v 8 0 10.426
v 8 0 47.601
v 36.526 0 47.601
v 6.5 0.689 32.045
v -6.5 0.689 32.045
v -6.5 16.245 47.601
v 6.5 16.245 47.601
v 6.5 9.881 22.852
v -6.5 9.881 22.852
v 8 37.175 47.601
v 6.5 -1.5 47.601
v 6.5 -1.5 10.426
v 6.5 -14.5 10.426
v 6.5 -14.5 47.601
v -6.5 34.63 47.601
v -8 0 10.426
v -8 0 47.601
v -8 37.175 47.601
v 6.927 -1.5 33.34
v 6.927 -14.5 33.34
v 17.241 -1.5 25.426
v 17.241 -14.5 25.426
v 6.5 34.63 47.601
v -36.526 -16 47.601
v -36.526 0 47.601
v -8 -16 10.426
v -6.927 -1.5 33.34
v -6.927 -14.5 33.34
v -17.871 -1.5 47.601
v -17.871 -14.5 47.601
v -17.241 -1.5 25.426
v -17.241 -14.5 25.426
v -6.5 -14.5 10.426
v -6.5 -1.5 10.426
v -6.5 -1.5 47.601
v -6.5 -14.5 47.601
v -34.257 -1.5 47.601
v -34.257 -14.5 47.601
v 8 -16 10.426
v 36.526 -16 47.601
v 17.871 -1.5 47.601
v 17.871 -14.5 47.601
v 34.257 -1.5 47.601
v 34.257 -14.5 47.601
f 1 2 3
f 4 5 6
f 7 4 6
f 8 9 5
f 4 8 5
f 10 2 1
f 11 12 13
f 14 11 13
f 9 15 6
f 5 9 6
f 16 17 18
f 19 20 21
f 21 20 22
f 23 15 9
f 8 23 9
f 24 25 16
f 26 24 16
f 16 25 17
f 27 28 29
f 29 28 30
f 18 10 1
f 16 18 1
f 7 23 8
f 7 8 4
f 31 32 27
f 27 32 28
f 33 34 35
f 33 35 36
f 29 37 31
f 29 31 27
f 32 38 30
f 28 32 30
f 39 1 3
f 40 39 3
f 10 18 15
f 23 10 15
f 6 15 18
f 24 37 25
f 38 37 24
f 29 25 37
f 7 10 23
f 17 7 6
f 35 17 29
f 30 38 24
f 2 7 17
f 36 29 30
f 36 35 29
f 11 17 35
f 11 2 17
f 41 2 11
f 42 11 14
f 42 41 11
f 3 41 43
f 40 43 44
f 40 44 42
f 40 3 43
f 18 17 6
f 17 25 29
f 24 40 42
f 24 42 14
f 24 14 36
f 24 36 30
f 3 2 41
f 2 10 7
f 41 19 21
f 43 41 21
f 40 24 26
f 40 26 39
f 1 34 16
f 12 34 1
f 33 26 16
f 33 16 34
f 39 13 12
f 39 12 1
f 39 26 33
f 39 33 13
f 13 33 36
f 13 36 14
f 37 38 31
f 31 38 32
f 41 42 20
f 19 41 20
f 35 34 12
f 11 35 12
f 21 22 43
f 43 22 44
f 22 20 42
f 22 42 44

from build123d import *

# Parameters (mm, degrees)
F1_DEPTH      = 16
F3_DEPTH      = 8
F3_DEPTH_BACK = 8
F4_W          = 16
F4_H          = 10.4258029827
F5_DEPTH      = 45.4
F7_DEPTH      = 25
F9_START      = -1.5
F9_DEPTH      = 13
F11_START     = -1.5
F11_DEPTH     = 13
F12_W         = 13
F12_H         = 13
F13_DEPTH     = 45.8


# Not quite as in the source:
# - a feature of the source that left no trace in its solid (it failed there, or was rolled back) is left out


with BuildPart() as f1:
    # F0 (on Front) → F1 (new body)
    with BuildSketch(Plane.XZ):
        Polygon((-36.5256857405, 47.6012004175), (0, 0), (36.5256857405, 47.6012004175), align=None)
    extrude(amount=F1_DEPTH)

    # F2 (on Right) → F3 (join, two sides)
    with BuildSketch(Plane.YZ) as f3_sk:
        Polygon((0, 47.6012004175), (0, 0), (47.6012004175, 47.6012004175), align=None)
    extrude(amount=F3_DEPTH)
    extrude(f3_sk.sketch, amount=-F3_DEPTH_BACK)

    # F4 (on face) → F5 (cut)
    with BuildSketch(Plane.XZ.offset(16)):
        with Locations((0, 5.2129014914)):
            Rectangle(F4_W, F4_H)
    extrude(amount=-F5_DEPTH, mode=Mode.SUBTRACT)

    # F6 (on face) → F7 (cut)
    with BuildSketch(Plane.YZ.offset(8)):
        Polygon((37.1753974347, 47.6012004175), (0, 10.4258029827), (10.4258029827, 10.4258029827), (47.6012004175, 47.6012004175), align=None)
    extrude(amount=-F7_DEPTH, mode=Mode.SUBTRACT)

    # F8 (on face) → F9 (cut)
    with BuildSketch(Plane.XZ.offset(16).offset(F9_START)):
        Polygon((-54.3261755364, 73.7560737056), (-17.2410544745, 25.4258029827), (-6.9274610507, 33.3397015598), (-44.0125821126, 81.6699722827), align=None)
        Polygon((6.9274610507, 33.3397015598), (17.2410544745, 25.4258029827), (53.1179434037, 72.181474934), (42.8043499799, 80.0953735111), align=None)
    extrude(amount=-F9_DEPTH, mode=Mode.SUBTRACT)

    # F10 (on face) → F11 (cut)
    with BuildSketch(Plane(origin=(-8, 0, 0), x_dir=(0, -1, 0), z_dir=(-1, 0, 0)).offset(F11_START)):
        Polygon((-16.2450367116, 47.6012004175), (-34.6298130225, 47.6012004175), (-9.8810756809, 22.8524630759), (-0.6886875255, 32.0448512314), align=None)
    extrude(amount=-F11_DEPTH, mode=Mode.SUBTRACT)

    # F12 (on face) → F13 (cut)
    with BuildSketch(Plane(origin=(0, 0, 10.4258029827), x_dir=(1, 0, 0), z_dir=(0, 0, -1))):
        with Locations((0, 8)):
            Rectangle(F12_W, F12_H)
    extrude(amount=-F13_DEPTH, mode=Mode.SUBTRACT)


solid = f1.part
